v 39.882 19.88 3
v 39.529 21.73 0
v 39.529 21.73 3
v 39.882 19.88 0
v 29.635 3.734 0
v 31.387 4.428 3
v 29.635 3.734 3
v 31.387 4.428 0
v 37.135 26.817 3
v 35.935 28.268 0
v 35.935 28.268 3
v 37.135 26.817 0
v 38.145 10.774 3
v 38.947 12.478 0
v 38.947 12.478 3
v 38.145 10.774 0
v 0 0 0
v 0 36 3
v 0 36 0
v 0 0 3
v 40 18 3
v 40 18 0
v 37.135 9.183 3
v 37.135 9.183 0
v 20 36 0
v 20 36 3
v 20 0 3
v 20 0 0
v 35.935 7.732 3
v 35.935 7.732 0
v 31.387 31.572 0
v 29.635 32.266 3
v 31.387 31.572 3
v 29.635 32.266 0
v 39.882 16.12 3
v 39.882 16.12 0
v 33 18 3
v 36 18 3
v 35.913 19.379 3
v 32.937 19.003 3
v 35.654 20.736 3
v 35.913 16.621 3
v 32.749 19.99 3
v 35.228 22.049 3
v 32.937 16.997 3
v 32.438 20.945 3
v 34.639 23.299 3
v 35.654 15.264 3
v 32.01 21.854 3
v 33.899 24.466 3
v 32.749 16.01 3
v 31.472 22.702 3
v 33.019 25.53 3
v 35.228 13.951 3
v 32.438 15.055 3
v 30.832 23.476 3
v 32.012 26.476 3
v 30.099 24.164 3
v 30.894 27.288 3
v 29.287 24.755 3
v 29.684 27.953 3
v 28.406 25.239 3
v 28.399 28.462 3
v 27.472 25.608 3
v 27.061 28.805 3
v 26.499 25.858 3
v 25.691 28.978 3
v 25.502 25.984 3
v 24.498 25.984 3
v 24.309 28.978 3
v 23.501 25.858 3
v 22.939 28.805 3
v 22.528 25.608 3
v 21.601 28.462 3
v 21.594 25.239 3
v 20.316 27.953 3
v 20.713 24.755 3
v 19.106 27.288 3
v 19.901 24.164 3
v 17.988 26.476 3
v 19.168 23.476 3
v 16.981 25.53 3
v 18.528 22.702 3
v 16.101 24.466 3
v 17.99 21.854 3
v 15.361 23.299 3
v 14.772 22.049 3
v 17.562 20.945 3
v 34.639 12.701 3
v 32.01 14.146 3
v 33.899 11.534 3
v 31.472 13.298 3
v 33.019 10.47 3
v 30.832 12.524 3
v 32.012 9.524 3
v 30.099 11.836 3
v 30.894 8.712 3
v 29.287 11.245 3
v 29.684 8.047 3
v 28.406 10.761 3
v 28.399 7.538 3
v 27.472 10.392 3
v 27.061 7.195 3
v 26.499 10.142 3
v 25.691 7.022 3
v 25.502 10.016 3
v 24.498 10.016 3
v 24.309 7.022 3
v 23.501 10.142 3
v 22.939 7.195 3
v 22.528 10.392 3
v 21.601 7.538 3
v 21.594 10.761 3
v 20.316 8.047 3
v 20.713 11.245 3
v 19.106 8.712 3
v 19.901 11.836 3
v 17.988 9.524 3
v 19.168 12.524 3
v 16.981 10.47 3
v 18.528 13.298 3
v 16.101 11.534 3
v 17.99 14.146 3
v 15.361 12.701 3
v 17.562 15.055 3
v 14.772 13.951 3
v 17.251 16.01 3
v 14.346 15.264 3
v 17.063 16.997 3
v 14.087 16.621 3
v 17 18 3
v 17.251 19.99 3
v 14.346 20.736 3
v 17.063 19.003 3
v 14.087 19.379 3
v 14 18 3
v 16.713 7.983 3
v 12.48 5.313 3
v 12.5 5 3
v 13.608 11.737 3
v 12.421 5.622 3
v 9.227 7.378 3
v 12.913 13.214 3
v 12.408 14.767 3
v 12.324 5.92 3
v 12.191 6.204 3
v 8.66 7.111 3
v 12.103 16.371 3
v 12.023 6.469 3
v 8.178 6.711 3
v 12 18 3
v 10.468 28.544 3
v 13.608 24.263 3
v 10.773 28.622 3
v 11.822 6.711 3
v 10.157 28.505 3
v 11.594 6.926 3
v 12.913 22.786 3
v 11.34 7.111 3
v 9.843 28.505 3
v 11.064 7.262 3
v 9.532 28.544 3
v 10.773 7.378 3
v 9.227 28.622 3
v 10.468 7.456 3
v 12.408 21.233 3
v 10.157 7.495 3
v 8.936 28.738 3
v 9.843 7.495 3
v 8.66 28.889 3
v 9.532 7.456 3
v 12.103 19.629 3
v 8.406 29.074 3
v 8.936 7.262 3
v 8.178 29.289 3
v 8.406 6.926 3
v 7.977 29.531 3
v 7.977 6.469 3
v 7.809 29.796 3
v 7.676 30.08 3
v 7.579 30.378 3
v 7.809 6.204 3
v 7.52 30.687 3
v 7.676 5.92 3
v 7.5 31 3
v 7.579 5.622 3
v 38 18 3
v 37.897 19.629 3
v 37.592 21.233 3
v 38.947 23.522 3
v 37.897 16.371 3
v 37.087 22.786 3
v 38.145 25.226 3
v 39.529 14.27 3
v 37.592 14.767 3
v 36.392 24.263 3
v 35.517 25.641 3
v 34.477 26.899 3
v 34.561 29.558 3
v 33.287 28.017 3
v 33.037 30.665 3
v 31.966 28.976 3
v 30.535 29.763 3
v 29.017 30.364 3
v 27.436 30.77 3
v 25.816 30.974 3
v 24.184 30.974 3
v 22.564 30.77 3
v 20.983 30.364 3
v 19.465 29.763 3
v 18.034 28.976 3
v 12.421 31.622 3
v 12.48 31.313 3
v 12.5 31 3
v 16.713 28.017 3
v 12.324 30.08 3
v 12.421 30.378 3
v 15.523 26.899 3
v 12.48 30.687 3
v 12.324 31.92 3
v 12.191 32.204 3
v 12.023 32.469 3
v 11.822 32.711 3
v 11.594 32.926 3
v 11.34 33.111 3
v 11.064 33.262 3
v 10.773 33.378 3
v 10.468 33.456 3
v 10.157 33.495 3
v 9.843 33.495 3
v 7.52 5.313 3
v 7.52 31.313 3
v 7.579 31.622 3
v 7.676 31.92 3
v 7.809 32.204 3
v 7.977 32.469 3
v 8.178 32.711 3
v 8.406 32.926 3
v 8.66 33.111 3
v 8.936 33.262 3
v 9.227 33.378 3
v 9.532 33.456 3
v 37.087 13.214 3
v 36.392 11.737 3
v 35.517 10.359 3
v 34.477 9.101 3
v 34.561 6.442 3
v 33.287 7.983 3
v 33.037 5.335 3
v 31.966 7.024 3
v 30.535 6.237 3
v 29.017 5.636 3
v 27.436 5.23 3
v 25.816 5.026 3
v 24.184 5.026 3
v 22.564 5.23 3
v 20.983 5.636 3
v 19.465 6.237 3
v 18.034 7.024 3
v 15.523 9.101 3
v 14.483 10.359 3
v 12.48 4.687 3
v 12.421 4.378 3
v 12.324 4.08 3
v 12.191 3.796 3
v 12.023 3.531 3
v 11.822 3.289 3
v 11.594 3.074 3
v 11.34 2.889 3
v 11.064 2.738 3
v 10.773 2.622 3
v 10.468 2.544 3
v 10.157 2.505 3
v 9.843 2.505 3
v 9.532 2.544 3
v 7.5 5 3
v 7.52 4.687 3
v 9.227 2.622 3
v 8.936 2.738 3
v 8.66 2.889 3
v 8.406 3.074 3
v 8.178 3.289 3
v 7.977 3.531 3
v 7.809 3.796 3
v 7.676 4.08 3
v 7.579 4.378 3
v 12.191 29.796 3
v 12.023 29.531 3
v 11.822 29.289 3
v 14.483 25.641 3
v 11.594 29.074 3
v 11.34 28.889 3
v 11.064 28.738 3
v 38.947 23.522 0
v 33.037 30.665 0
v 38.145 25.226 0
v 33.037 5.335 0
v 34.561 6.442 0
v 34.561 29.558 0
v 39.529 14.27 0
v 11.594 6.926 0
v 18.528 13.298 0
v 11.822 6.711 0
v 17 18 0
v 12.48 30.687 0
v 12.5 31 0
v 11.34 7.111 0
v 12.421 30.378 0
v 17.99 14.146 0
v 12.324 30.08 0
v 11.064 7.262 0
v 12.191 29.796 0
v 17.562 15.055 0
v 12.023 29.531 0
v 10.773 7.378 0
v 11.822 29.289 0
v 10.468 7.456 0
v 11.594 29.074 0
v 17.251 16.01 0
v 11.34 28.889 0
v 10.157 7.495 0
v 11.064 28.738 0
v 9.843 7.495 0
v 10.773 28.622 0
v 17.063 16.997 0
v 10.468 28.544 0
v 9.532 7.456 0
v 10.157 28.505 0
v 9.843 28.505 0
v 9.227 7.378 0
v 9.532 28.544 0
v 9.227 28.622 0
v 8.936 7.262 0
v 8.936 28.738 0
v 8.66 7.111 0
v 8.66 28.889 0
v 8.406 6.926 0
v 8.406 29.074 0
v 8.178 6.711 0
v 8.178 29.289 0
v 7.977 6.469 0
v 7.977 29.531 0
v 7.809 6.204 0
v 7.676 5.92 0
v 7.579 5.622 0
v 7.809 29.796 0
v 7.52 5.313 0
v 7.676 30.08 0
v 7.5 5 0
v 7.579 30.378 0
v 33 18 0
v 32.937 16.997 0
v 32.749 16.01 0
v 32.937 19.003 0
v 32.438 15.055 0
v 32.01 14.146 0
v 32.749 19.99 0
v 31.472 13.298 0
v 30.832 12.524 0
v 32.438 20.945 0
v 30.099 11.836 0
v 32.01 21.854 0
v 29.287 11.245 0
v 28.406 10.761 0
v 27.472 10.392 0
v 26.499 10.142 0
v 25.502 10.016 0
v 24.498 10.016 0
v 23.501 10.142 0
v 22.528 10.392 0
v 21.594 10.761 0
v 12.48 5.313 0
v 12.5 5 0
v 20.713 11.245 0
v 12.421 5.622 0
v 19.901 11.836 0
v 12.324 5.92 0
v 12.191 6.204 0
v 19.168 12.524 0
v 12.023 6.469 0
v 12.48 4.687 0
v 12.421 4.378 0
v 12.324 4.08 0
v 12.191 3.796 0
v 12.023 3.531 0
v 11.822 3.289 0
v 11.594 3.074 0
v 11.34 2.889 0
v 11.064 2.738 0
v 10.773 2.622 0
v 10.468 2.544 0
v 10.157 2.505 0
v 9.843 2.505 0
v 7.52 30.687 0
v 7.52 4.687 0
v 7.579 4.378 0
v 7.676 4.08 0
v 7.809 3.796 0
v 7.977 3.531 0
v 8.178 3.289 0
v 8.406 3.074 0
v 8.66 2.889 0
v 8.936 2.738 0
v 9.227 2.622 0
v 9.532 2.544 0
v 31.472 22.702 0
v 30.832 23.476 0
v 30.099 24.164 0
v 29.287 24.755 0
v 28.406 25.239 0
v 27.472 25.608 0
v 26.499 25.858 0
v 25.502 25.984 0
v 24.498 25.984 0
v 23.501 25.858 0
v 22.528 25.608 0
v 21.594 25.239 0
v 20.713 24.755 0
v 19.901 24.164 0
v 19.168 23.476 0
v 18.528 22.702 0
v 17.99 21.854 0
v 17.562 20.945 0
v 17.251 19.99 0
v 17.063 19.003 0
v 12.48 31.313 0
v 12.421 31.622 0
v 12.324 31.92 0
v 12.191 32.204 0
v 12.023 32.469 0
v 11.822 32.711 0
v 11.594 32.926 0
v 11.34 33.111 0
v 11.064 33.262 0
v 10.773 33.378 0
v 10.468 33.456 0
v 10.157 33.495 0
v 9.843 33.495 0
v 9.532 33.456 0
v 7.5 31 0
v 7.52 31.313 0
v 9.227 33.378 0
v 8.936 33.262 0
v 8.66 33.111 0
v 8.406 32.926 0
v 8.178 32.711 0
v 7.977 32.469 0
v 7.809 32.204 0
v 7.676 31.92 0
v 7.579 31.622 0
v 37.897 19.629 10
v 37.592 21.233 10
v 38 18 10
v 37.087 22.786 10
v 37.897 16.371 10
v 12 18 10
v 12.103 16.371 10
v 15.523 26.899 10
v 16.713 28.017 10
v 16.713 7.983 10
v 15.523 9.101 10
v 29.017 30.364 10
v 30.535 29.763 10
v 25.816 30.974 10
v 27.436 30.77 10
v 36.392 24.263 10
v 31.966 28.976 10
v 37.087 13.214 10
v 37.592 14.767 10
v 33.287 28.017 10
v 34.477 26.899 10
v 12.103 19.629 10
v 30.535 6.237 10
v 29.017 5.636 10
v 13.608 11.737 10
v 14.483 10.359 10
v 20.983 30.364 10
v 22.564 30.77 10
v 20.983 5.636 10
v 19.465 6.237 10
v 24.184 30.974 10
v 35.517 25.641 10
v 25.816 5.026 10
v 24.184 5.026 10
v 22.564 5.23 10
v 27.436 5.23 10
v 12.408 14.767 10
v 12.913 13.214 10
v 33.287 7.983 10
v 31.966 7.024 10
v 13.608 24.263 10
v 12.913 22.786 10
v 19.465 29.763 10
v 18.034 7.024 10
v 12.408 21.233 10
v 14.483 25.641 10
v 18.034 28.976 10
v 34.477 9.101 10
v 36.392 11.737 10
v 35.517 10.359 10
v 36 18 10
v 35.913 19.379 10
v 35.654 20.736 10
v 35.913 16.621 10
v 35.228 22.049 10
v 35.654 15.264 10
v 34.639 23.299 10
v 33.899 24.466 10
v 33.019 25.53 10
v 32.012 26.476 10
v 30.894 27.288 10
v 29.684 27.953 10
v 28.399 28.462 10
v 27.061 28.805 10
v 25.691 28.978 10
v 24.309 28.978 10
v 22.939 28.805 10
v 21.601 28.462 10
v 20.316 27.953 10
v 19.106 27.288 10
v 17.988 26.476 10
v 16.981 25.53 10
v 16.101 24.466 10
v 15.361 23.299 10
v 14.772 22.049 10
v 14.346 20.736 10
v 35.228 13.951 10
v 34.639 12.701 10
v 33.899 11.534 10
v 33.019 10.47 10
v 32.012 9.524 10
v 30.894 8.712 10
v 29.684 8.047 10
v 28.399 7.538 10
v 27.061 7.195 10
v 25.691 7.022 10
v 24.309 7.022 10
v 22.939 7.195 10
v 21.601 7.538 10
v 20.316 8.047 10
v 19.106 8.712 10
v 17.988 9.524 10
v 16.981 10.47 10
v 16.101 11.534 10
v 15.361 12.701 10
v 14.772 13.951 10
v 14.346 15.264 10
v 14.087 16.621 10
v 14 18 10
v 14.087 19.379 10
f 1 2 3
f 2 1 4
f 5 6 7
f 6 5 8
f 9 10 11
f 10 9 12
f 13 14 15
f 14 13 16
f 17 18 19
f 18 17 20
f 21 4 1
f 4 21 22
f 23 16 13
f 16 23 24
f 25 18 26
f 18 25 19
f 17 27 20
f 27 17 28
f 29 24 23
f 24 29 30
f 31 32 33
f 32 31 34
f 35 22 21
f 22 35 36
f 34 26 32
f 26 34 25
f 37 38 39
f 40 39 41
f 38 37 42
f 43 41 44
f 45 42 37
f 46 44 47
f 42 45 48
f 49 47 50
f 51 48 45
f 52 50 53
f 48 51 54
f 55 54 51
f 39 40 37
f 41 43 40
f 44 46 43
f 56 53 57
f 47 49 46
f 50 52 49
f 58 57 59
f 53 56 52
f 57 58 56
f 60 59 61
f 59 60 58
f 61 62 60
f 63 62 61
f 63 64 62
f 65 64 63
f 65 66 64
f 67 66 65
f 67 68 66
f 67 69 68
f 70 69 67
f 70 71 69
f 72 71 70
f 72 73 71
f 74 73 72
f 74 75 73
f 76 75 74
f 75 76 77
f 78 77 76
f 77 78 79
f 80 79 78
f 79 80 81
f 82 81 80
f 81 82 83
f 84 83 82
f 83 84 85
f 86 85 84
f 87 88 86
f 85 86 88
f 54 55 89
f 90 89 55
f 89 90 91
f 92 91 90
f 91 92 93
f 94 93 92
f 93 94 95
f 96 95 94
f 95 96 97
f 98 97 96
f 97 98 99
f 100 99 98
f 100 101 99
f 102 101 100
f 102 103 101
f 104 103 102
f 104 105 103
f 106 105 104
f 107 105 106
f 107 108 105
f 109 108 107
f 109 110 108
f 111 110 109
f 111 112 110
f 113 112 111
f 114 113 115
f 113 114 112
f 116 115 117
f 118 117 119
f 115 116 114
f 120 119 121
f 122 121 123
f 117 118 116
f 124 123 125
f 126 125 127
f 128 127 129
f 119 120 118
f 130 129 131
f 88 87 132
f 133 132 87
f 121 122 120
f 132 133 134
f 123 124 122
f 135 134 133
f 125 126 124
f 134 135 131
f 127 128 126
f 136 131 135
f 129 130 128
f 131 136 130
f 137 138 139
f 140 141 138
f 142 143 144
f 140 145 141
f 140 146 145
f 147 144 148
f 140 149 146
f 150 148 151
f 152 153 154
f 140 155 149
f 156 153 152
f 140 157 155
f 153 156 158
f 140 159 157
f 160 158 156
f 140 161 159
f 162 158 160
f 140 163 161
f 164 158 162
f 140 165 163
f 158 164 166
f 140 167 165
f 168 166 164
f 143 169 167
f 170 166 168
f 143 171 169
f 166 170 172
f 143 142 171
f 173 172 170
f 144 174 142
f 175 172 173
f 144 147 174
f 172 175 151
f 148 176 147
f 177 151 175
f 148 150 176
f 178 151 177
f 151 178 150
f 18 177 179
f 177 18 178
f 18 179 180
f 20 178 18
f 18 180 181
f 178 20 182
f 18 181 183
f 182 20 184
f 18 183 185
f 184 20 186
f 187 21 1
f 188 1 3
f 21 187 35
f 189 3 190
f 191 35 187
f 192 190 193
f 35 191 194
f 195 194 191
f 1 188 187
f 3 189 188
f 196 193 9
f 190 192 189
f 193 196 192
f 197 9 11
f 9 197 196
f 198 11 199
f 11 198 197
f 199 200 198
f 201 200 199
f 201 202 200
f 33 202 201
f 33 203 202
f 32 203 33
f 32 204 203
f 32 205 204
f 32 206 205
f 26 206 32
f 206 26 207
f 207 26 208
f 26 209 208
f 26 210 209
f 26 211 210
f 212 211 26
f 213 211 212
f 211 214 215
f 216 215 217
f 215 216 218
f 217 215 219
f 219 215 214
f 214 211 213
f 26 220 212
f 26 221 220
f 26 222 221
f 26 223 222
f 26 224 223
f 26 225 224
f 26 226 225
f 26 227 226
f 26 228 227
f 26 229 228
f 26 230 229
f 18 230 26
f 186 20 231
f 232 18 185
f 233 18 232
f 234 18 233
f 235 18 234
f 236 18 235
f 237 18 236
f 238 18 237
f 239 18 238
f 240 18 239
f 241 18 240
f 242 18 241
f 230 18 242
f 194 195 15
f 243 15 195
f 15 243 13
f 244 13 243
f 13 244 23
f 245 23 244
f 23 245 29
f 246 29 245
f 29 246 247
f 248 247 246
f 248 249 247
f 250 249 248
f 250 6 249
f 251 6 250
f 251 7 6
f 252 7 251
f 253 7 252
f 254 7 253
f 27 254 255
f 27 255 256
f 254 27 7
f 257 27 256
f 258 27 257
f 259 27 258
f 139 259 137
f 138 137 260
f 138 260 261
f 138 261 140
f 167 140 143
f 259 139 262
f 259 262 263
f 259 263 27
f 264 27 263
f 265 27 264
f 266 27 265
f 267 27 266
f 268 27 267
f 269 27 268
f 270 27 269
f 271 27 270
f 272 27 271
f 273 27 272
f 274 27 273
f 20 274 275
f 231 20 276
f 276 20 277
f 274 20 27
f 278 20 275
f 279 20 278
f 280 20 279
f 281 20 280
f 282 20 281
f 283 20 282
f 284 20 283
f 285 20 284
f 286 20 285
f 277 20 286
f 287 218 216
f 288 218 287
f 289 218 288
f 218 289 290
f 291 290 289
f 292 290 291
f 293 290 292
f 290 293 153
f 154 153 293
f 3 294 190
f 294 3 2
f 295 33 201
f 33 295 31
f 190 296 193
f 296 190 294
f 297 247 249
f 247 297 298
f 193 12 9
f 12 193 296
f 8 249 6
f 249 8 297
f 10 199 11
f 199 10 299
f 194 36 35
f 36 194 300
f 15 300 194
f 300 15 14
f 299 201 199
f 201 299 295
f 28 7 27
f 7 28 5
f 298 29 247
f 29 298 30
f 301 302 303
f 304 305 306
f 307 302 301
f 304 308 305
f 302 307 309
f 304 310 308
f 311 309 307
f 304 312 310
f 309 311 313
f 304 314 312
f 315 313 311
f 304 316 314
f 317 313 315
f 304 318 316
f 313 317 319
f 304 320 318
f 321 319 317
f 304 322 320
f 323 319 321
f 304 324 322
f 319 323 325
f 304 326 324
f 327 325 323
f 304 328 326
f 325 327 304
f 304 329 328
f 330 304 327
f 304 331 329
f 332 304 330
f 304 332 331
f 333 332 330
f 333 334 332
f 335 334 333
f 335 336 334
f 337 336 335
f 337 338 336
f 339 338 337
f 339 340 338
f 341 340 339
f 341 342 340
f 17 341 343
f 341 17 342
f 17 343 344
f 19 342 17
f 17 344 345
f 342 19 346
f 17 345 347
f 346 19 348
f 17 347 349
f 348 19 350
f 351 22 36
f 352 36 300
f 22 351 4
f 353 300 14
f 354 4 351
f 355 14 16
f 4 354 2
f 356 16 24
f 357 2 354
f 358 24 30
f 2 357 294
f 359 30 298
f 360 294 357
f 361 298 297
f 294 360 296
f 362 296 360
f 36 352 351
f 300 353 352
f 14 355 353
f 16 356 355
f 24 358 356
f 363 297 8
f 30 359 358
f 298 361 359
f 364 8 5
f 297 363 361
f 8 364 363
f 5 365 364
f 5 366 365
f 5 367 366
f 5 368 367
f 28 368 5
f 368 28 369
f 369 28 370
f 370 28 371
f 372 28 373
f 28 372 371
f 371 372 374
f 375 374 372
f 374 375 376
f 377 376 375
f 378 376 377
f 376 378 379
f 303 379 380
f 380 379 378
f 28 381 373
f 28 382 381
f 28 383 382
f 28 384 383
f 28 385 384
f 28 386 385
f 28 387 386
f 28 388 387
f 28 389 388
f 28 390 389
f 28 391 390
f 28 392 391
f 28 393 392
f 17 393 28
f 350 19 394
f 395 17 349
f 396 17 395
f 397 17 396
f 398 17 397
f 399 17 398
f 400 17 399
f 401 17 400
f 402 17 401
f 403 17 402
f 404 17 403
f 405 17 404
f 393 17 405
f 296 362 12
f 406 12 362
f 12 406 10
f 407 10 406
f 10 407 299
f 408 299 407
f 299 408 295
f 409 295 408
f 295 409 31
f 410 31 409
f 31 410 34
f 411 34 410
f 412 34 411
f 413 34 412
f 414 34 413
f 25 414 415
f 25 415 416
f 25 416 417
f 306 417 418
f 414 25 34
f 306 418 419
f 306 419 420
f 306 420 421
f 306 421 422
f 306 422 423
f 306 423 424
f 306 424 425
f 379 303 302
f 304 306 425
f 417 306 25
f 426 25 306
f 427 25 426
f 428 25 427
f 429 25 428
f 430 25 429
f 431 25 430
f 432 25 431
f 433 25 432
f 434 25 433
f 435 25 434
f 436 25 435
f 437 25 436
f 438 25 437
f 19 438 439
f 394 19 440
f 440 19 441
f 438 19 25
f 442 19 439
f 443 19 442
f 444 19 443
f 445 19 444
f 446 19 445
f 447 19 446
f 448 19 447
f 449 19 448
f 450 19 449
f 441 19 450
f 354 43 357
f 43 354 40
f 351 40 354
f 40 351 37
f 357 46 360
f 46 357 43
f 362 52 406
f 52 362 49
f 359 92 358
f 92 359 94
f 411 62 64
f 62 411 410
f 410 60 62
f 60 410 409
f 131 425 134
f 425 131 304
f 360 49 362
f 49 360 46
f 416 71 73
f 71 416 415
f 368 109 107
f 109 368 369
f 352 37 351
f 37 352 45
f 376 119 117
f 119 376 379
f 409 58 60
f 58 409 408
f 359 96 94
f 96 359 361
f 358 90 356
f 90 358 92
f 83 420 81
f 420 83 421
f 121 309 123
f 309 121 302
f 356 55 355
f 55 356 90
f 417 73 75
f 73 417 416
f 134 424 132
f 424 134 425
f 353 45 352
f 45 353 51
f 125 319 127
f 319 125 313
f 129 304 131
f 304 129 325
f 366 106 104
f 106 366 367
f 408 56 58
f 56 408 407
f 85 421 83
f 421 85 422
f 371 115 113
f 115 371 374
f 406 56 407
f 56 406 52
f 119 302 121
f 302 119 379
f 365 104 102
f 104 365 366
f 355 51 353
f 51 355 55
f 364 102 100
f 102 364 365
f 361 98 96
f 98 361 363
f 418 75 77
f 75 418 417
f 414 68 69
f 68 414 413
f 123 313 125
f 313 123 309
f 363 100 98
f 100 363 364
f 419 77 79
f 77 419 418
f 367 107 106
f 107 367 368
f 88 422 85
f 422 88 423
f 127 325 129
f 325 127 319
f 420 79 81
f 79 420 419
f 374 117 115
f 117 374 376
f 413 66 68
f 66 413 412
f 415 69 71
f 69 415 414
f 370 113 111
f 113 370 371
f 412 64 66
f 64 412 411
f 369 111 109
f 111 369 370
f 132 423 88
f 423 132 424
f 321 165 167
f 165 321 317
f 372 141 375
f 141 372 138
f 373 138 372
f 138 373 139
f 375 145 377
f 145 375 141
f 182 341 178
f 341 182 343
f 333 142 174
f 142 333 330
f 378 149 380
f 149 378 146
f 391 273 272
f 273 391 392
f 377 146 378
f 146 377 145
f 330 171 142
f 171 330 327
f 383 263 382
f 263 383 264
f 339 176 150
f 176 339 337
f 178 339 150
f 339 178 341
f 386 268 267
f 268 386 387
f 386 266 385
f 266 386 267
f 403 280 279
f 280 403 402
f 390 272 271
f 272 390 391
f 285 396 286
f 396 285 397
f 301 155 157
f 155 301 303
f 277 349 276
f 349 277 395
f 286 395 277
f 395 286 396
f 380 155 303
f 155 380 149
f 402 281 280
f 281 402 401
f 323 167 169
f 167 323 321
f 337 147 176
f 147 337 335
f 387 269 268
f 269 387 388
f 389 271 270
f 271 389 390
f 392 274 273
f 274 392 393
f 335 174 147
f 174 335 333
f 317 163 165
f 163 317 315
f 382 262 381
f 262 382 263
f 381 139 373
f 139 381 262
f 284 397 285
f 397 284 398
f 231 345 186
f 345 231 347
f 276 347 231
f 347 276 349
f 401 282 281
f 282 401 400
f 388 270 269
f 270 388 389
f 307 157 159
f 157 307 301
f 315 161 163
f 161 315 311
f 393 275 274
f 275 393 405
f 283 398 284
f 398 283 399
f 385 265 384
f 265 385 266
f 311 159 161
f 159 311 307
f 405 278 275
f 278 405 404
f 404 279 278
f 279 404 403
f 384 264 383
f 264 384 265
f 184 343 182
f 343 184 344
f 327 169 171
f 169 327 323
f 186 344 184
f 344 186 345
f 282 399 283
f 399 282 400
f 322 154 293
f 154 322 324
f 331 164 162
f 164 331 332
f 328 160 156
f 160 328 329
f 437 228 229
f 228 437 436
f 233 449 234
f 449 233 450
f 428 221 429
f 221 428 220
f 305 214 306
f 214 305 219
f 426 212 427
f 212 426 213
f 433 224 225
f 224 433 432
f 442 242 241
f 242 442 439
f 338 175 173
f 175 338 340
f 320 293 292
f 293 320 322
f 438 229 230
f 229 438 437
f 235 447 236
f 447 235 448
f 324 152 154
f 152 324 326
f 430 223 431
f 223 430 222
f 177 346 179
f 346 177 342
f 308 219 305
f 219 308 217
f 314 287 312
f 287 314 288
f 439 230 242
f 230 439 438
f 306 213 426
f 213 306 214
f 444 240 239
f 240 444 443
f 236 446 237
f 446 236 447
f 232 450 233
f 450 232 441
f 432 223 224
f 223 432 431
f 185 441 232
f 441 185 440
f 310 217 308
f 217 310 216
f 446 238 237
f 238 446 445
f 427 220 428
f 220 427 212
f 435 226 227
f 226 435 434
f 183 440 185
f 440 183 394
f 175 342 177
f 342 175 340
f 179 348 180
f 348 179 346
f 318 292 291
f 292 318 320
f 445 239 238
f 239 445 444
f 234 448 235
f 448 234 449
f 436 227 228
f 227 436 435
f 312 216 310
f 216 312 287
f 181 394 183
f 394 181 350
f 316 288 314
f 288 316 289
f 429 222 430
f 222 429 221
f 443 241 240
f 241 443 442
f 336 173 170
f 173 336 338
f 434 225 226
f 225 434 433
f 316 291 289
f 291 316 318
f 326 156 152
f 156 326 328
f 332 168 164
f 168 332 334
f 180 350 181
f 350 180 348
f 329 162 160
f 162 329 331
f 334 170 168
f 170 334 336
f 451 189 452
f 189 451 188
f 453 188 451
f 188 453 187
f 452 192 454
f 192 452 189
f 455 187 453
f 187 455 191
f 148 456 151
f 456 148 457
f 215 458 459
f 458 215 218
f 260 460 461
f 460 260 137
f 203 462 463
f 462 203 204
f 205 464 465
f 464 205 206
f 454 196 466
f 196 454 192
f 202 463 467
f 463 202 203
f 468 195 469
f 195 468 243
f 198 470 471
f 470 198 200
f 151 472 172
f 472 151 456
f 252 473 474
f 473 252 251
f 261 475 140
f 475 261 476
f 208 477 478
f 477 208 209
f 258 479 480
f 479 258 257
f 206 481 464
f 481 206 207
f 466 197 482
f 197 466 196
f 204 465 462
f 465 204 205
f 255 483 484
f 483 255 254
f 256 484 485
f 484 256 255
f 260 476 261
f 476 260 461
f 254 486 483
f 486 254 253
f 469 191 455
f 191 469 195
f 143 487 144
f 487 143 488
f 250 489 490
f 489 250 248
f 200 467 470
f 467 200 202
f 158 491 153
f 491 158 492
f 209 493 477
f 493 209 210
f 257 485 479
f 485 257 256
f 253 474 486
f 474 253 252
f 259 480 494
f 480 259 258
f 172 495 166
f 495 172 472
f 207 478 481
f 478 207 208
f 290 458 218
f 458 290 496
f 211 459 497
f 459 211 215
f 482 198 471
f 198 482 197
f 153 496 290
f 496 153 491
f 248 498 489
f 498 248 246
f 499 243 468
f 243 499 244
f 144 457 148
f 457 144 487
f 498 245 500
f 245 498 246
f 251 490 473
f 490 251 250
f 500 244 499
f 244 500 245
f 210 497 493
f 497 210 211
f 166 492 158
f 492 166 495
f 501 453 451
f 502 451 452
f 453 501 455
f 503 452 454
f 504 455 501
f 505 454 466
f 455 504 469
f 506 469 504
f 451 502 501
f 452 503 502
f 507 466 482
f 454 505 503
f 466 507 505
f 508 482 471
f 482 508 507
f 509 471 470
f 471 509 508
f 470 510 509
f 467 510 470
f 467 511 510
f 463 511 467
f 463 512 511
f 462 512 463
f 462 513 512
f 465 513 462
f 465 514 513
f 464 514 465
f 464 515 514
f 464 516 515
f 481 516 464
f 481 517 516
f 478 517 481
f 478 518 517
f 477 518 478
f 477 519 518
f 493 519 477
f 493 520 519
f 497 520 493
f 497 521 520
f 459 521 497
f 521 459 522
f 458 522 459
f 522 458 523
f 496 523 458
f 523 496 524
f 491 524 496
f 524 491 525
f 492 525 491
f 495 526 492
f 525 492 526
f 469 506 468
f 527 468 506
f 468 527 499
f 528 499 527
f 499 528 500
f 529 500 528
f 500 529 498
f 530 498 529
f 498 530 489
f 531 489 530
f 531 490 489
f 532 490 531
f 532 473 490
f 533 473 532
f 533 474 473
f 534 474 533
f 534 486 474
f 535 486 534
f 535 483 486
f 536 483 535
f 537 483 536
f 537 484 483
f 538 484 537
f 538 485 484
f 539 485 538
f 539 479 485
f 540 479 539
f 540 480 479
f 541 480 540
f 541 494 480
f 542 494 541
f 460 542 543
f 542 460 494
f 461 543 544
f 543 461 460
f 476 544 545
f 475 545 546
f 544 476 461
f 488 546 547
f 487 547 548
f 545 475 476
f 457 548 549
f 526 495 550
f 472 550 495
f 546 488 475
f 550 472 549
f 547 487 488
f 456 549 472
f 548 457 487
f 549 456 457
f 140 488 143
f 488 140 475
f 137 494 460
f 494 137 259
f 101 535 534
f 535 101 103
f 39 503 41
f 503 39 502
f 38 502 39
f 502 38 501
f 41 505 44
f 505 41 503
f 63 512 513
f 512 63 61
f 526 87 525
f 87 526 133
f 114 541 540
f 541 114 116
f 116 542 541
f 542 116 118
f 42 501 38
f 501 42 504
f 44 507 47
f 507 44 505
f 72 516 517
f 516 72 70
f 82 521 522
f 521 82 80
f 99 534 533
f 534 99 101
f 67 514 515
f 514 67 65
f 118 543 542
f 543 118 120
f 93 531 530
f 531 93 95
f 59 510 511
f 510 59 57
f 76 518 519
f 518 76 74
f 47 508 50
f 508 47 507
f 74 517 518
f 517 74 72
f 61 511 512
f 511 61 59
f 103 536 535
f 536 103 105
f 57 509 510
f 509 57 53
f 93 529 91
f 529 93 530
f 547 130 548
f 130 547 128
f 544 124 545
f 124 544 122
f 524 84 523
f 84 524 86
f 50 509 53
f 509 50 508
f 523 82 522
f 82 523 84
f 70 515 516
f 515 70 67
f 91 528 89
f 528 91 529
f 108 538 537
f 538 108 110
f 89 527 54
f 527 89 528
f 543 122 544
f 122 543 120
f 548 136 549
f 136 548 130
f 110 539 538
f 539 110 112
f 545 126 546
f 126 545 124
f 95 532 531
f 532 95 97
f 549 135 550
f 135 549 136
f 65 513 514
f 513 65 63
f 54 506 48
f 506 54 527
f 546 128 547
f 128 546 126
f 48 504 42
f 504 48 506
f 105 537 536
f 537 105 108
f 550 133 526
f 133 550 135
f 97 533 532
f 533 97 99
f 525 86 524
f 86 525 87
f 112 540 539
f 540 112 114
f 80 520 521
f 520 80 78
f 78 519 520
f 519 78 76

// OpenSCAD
$fn=50;
dim_x=20;
dim_y=50-4-10;
plate_thickness=3;
hole_pos=5;
module holder(){
difference(){
    hull(){
cube([dim_x,dim_y,plate_thickness]);
       translate([20+5,dim_y/2,0]) cylinder(r=15,h=plate_thickness);
    }
    translate([20+5,dim_y/2,0]) cylinder(r=8,h=7);
    translate([10,hole_pos,0]) cylinder(r=2.5,h=7);
     translate([10,dim_y-hole_pos,0]) cylinder(r=2.5,h=7);
    
};


    translate([20+5,dim_y/2,plate_thickness]){
        difference(){
cylinder(r=13,h=7);
cylinder(r=11,h=7);
        }
    
}

};
holder();
module cap(){
translate([50,0,0]) 

difference(){
cylinder(r=15,h=9);
cylinder(r=13.1,h=7.5);
    cylinder(r=9,h=20);
        }
    };
        
        
       //# translate([dim_x/2,dim_y/2,0]) cylinder(r=4,h=15);
        
       //# cube([20,100,20]);
